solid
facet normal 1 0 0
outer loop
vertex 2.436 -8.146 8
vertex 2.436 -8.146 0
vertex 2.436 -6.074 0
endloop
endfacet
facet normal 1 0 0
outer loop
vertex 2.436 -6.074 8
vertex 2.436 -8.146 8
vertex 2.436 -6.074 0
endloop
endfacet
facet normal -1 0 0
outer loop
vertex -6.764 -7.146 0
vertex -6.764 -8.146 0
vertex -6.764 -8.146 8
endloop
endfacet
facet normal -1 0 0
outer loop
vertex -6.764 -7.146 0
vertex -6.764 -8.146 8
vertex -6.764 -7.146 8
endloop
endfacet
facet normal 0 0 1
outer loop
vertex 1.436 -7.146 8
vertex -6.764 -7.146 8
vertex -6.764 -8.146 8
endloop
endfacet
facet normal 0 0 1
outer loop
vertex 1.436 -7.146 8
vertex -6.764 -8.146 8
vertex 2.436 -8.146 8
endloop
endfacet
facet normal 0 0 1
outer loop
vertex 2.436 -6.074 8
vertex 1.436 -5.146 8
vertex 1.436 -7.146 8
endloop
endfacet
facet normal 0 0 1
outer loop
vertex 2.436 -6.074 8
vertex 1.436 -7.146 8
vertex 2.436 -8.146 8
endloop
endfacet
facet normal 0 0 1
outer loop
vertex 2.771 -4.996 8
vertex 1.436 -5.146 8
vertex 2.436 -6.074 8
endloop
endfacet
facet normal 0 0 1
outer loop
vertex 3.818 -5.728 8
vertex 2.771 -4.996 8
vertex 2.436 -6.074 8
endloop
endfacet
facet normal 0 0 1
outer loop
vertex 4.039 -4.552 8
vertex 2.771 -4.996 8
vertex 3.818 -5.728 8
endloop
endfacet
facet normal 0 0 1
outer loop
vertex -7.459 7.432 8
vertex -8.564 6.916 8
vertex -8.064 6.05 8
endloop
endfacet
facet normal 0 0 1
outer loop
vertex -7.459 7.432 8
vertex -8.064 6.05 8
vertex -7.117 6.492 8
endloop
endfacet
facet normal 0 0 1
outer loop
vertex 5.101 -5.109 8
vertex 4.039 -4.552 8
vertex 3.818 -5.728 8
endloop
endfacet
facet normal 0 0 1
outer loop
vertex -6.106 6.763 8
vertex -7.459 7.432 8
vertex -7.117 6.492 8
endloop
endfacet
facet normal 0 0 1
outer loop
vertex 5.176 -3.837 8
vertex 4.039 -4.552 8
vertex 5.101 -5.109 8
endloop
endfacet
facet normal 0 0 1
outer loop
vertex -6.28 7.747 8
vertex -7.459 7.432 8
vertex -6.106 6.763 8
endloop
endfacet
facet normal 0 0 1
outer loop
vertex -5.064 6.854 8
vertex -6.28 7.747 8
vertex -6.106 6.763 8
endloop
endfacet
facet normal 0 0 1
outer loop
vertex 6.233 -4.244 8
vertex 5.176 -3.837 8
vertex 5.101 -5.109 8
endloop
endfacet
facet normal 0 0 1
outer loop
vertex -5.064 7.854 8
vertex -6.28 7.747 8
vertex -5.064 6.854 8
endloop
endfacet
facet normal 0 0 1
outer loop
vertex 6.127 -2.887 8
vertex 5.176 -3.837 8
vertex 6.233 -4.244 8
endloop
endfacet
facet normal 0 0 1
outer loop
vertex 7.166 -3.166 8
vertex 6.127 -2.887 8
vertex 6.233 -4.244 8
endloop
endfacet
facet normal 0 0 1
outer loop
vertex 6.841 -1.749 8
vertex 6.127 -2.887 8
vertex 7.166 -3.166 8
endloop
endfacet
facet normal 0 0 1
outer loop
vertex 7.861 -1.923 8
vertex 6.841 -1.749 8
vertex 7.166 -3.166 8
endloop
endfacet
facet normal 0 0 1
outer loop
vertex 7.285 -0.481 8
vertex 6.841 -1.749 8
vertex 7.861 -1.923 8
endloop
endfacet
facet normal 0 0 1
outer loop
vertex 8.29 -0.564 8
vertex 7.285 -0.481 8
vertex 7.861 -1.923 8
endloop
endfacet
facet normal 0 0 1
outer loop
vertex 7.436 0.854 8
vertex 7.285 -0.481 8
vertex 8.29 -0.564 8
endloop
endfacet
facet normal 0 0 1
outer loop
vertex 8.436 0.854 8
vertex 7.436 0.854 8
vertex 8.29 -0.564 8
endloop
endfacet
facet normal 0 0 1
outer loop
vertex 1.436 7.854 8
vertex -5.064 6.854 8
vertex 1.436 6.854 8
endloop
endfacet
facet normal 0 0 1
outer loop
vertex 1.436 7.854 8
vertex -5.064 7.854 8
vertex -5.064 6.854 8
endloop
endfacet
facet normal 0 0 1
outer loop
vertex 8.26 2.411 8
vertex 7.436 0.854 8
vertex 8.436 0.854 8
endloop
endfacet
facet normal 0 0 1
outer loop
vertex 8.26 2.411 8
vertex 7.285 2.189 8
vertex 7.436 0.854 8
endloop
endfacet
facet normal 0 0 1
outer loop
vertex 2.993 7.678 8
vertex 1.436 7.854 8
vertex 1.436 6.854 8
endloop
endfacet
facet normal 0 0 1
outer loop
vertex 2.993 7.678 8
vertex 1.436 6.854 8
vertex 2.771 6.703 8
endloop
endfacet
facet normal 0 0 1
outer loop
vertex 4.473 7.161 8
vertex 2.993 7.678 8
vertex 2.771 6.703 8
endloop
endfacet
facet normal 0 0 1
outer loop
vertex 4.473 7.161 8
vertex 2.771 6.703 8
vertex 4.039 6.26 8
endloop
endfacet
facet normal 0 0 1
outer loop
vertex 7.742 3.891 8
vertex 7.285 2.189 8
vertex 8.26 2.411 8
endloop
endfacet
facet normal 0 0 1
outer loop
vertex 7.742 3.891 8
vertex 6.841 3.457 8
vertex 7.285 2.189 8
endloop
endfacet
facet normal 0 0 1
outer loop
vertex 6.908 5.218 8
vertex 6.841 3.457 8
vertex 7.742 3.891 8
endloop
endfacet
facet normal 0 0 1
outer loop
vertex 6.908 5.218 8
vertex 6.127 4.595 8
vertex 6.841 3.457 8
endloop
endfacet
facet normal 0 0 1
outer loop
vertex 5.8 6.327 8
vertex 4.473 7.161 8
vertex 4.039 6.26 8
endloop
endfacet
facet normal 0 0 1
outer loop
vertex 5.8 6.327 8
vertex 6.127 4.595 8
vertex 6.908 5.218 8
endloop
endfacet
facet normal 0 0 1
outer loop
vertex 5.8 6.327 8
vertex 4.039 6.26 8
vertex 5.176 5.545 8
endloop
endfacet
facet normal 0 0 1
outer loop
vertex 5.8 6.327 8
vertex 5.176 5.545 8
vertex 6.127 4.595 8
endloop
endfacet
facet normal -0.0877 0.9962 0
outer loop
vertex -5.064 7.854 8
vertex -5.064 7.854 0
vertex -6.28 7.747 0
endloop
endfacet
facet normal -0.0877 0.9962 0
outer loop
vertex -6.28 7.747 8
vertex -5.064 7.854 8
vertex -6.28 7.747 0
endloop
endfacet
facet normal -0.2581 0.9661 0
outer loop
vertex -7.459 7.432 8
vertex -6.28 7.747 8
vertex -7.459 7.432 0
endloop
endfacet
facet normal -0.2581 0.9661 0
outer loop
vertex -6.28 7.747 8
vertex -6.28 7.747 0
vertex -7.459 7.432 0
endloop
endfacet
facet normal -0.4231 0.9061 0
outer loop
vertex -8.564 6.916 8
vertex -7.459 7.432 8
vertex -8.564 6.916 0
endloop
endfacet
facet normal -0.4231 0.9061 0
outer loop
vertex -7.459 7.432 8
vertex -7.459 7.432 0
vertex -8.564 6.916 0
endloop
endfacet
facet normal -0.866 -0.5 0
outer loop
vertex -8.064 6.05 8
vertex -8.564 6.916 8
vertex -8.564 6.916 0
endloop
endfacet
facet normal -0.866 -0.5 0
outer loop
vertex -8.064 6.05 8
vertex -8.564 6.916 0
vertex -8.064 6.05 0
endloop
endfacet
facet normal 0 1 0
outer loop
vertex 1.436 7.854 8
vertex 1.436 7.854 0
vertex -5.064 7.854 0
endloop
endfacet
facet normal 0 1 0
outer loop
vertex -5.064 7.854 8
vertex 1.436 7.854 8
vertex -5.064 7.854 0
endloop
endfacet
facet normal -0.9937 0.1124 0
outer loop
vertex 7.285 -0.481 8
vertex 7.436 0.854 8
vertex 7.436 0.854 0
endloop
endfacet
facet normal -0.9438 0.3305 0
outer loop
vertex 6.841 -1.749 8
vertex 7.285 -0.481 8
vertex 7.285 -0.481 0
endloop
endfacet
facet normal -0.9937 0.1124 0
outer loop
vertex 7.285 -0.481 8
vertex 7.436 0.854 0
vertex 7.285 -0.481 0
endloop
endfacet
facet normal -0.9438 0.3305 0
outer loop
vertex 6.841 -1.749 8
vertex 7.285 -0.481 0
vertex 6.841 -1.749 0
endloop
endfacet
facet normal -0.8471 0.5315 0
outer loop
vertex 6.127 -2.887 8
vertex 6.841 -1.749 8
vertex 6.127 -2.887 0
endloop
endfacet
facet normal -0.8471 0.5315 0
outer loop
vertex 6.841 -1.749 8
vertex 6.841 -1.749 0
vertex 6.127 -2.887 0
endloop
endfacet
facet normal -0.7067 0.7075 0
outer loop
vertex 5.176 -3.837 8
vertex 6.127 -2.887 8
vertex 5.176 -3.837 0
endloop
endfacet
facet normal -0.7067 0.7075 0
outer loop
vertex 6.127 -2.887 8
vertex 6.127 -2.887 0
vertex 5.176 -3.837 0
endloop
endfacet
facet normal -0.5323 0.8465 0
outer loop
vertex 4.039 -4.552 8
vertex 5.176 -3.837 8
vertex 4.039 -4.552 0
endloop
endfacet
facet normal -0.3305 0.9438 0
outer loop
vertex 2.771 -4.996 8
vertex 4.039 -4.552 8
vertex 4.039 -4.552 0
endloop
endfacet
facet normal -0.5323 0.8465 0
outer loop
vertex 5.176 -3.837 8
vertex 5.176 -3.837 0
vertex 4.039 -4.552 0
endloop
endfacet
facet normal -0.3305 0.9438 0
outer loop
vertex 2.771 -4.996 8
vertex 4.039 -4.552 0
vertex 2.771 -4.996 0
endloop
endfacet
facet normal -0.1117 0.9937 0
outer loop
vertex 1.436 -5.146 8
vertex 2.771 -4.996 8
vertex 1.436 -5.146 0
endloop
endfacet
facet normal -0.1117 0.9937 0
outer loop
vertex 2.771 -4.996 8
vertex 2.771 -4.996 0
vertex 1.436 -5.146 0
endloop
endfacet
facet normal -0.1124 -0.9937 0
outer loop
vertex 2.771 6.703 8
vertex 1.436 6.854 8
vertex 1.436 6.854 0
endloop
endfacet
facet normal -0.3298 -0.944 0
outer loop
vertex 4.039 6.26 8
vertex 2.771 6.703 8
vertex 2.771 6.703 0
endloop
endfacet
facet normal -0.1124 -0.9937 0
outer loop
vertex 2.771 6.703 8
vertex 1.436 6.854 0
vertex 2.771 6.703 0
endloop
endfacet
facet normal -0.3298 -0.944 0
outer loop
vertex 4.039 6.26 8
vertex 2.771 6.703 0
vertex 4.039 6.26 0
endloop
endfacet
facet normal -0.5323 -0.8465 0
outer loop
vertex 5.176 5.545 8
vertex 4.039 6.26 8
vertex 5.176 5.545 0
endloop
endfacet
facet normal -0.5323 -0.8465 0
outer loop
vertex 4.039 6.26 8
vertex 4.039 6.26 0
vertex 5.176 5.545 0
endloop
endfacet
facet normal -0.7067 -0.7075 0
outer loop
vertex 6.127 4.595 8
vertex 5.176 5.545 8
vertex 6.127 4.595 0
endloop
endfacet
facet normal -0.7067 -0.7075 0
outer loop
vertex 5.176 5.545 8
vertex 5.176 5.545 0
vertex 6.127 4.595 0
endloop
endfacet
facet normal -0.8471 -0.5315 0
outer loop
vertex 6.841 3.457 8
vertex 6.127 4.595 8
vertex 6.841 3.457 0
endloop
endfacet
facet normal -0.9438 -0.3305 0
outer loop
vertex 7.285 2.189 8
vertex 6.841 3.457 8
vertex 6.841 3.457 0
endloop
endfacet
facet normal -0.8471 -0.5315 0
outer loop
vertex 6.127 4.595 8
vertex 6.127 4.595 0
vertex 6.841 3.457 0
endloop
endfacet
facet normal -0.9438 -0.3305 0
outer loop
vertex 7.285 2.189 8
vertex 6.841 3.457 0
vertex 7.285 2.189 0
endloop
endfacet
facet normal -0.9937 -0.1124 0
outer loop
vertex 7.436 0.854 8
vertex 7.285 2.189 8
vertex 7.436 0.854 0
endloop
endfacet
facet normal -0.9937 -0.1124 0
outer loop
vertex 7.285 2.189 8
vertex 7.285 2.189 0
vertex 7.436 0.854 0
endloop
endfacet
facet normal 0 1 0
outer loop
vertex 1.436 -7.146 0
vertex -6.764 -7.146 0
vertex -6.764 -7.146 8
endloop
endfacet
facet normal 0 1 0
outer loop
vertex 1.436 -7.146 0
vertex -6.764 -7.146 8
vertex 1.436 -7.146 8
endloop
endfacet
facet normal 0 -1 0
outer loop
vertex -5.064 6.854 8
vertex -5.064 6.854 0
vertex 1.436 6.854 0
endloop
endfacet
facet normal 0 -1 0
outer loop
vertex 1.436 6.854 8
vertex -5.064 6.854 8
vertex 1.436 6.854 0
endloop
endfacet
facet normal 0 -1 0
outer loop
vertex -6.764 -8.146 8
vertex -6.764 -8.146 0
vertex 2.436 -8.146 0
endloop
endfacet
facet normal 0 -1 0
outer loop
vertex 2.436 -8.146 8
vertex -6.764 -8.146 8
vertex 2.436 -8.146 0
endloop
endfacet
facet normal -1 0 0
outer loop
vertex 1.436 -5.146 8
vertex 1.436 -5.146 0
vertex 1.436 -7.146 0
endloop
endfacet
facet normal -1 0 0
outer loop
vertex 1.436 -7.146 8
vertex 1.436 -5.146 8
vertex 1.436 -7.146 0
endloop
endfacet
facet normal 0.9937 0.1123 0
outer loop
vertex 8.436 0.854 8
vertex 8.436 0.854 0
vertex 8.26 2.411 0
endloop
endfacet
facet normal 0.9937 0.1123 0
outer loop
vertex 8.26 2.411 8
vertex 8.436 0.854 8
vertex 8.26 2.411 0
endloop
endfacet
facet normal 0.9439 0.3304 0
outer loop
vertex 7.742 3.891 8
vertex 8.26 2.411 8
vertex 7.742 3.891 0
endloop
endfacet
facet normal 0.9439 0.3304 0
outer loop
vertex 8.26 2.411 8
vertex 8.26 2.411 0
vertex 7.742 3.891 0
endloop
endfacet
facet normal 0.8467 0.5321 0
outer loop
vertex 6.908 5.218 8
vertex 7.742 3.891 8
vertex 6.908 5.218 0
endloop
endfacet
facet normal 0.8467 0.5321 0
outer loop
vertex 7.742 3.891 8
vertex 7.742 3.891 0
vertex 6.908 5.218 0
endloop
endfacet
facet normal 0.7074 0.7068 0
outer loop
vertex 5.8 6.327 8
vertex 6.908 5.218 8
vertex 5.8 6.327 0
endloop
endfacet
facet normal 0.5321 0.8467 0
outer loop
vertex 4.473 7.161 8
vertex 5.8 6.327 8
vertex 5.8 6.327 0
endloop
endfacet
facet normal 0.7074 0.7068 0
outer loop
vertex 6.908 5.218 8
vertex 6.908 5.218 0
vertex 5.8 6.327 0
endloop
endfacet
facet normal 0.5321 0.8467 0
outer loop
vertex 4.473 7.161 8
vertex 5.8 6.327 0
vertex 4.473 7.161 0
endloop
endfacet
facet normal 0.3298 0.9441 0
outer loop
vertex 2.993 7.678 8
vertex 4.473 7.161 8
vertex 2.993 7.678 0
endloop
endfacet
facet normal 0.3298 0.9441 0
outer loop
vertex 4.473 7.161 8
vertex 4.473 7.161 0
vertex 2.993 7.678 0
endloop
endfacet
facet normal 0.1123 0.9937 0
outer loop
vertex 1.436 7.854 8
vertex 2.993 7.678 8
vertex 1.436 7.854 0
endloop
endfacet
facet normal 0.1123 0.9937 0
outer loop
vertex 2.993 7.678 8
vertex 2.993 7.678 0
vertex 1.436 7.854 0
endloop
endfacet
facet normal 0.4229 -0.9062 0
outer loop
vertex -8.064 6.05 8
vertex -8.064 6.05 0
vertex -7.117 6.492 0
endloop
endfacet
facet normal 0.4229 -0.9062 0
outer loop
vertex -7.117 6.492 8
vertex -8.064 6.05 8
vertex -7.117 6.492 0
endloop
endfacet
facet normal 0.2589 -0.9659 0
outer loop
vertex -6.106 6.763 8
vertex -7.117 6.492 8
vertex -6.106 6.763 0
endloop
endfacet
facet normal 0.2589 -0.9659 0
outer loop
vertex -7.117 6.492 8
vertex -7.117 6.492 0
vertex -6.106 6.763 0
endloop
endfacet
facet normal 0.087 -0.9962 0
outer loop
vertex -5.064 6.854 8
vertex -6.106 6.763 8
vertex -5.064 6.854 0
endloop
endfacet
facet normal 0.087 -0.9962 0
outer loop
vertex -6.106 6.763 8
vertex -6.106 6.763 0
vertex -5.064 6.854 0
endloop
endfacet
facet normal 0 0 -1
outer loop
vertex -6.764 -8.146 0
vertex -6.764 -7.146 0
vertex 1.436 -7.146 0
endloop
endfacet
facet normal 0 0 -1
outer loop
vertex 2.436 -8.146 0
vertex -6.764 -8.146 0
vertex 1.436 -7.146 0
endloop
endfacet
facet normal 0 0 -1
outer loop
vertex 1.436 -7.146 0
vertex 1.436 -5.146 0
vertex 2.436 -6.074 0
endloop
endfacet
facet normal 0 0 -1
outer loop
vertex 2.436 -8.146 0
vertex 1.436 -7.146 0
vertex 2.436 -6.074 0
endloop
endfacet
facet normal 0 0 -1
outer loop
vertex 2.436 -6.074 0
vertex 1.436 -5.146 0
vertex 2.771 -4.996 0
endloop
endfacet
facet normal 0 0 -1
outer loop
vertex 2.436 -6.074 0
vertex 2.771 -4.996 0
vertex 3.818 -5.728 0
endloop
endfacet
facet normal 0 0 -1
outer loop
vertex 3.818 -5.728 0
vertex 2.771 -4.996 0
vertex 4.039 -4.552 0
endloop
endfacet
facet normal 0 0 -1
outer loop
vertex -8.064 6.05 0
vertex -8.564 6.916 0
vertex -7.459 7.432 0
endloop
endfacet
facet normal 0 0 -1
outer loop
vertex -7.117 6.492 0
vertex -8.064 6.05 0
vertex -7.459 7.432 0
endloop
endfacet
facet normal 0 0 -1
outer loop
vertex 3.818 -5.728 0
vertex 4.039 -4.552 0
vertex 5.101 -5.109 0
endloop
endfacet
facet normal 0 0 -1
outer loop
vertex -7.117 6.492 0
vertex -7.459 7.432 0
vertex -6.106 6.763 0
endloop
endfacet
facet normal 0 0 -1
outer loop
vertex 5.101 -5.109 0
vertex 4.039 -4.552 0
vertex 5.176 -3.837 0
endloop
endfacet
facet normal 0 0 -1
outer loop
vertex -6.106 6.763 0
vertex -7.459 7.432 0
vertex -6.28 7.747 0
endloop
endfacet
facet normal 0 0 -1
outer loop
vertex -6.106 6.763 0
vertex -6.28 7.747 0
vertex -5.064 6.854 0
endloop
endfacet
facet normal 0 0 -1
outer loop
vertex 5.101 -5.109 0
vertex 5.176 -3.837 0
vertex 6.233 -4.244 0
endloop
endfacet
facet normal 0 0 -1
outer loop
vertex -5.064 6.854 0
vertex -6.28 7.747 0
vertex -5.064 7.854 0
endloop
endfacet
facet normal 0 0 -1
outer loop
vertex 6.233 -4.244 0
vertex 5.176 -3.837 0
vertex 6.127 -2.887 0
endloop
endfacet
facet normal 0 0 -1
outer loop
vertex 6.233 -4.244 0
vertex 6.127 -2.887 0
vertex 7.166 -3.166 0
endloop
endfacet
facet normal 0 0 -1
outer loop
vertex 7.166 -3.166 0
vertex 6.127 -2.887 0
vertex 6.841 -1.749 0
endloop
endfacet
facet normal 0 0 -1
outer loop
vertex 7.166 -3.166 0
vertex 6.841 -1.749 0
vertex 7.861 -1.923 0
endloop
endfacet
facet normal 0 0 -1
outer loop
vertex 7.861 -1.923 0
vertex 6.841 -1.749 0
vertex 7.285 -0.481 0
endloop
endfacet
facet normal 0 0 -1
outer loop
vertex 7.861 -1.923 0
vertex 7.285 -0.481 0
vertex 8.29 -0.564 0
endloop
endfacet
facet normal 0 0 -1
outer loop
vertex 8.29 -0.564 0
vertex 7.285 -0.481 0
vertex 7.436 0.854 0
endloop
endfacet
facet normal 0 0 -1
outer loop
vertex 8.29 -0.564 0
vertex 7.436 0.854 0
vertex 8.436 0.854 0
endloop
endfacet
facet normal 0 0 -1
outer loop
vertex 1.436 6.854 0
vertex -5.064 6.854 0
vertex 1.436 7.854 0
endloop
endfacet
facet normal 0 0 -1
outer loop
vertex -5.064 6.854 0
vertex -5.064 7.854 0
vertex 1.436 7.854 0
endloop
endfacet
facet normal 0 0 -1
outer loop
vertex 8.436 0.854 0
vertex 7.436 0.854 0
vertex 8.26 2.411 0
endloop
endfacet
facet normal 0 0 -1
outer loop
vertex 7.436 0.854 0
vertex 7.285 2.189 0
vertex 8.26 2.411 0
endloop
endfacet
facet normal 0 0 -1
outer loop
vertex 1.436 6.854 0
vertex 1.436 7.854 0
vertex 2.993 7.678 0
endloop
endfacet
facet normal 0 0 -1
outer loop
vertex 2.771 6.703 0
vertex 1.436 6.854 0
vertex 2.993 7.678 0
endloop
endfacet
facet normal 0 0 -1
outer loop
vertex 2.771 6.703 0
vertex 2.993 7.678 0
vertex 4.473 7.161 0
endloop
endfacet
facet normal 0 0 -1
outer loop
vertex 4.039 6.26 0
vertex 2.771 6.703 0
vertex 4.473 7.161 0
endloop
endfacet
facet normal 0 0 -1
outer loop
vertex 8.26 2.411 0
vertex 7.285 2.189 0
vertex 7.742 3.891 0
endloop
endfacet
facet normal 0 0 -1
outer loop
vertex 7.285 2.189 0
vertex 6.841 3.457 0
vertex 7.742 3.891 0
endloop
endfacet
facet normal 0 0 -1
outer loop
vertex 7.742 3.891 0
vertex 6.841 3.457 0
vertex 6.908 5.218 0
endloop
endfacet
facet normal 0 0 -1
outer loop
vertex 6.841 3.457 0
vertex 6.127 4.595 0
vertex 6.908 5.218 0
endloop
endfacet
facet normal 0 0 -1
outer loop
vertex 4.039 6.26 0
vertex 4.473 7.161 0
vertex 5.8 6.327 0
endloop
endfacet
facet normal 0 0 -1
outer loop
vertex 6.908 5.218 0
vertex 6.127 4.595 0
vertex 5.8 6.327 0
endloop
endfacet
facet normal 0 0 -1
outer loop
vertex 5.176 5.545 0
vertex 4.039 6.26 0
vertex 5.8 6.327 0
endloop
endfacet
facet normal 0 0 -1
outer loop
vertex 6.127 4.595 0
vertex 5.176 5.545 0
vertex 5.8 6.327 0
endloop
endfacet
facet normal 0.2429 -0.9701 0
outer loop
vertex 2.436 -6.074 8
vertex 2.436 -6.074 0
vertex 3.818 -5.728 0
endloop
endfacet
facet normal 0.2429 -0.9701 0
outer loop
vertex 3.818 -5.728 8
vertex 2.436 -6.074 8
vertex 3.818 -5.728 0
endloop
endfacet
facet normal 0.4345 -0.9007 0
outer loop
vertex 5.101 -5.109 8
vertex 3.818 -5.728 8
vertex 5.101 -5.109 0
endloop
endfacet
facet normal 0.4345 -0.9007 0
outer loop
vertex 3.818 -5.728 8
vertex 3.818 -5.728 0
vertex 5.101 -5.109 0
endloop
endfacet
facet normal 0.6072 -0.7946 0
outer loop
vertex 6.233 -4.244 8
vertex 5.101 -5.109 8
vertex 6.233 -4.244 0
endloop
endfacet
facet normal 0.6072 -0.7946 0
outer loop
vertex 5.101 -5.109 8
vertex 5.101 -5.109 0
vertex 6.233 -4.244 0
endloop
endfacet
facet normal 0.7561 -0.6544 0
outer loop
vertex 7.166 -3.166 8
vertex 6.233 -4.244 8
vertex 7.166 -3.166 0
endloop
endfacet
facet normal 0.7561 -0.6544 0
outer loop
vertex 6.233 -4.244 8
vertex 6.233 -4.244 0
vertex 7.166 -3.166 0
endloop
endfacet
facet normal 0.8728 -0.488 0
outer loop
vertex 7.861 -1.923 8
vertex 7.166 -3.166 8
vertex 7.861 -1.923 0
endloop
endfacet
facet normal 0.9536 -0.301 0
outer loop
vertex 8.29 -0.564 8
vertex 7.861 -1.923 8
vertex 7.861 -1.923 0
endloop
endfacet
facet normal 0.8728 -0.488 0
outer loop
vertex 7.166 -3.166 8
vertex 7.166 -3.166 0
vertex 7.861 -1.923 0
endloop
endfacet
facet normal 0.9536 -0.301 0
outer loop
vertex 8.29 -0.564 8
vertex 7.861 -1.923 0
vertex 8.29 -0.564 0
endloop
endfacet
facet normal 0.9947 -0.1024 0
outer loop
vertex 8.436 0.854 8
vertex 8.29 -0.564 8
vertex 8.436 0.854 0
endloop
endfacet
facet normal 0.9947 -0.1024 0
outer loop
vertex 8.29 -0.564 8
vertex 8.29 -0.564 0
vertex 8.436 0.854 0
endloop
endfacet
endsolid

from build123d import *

# Parameters (mm, degrees)
F0_W     = 8.2
F0_H     = 1
F1_DEPTH = 8


with BuildPart() as f1:
    # F0 (on Top) → F1 (new body)
    with BuildSketch(Plane.XY):
        with Locations((-2.6644755177, -7.6461574882)):
            Rectangle(F0_W, F0_H)
        with BuildLine():
            Line((1.4355244823, -6.1461574882), (1.4355244823, -7.1461574882))
            Line((1.4355244823, -7.1461574882), (1.4355244823, -8.1461574882))
            Line((1.4355244823, -8.1461574882), (2.4355244823, -8.1461574882))
            Line((2.4355244823, -8.1461574882), (2.4355244823, -6.0743607185))
            ThreePointArc((2.4355244823, -6.0743607185), (1.9368115199, -6.1281852242), (1.4355244823, -6.1461574882))
        make_face()
        with BuildLine():
            Line((1.4355244823, -5.1461574882), (1.4355244823, -6.1461574882))
            ThreePointArc((1.4355244823, -6.1461574882), (1.9368115199, -6.1281852242), (2.4355244823, -6.0743607185))
            Line((2.4355244823, -6.0743607185), (2.4355244823, -5.1461574882))
            Line((2.4355244823, -5.1461574882), (1.4355244823, -5.1461574882))
        make_face()
        with BuildLine():
            ThreePointArc((7.4355244823, 0.8538425118), (5.6781651694, -3.3887981753), (1.4355244823, -5.1461574882))
            Line((1.4355244823, -5.1461574882), (2.4355244823, -5.1461574882))
            Line((2.4355244823, -5.1461574882), (2.4355244823, -6.0743607185))
            ThreePointArc((2.4355244823, -6.0743607185), (6.7270271044, -3.7287331832), (8.4355244823, 0.8538425118))
            ThreePointArc((8.4355244823, 0.8538425118), (6.3852719506, 5.8035899801), (1.4355244823, 7.8538425118))
            Line((1.4355244823, 7.8538425118), (1.4355244823, 6.8538425118))
            ThreePointArc((1.4355244823, 6.8538425118), (5.6781651694, 5.0964831989), (7.4355244823, 0.8538425118))
        make_face()
        with BuildLine():
            ThreePointArc((-5.0644755177, 7.8538425118), (-6.8762088334, 7.6153232958), (-8.5644755177, 6.9160203383))
            Line((-8.5644755177, 6.9160203383), (-8.0644755177, 6.0499949345))
            ThreePointArc((-8.0644755177, 6.0499949345), (-6.6173897883, 6.6493974695), (-5.0644755177, 6.8538425118))
            Line((-5.0644755177, 6.8538425118), (-5.0644755177, 7.8538425118))
        make_face()
        with BuildLine():
            Line((-1.4589242423, 6.8538425118), (1.4355244823, 6.8538425118))
            Line((1.4355244823, 6.8538425118), (1.4355244823, 7.8538425118))
            ThreePointArc((1.4355244823, 7.8538425118), (-0.2380064128, 7.6508487898), (-1.8144755177, 7.0536408956))
            ThreePointArc((-1.8144755177, 7.0536408956), (-1.6352444565, 6.956331703), (-1.4589242423, 6.8538425118))
        make_face()
        with BuildLine():
            ThreePointArc((-1.8144755177, 7.0536408956), (-3.3909446227, 7.6508487898), (-5.0644755177, 7.8538425118))
            Line((-5.0644755177, 7.8538425118), (-5.0644755177, 6.8538425118))
            Line((-5.0644755177, 6.8538425118), (-2.1700267932, 6.8538425118))
            ThreePointArc((-2.1700267932, 6.8538425118), (-1.9937065789, 6.956331703), (-1.8144755177, 7.0536408956))
        make_face()
        with BuildLine():
            Line((1.4355244823, 7.8538425118), (-5.0644755177, 7.8538425118))
            ThreePointArc((-5.0644755177, 7.8538425118), (-3.3909446227, 7.6508487898), (-1.8144755177, 7.0536408956))
            ThreePointArc((-1.8144755177, 7.0536408956), (-0.2380064128, 7.6508487898), (1.4355244823, 7.8538425118))
        make_face()
        with BuildLine():
            Line((-2.1700267932, 6.8538425118), (-1.4589242423, 6.8538425118))
            ThreePointArc((-1.4589242423, 6.8538425118), (-1.6352444565, 6.956331703), (-1.8144755177, 7.0536408956))
            ThreePointArc((-1.8144755177, 7.0536408956), (-1.9937065789, 6.956331703), (-2.1700267932, 6.8538425118))
        make_face()
    extrude(amount=F1_DEPTH)


solid = f1.part
